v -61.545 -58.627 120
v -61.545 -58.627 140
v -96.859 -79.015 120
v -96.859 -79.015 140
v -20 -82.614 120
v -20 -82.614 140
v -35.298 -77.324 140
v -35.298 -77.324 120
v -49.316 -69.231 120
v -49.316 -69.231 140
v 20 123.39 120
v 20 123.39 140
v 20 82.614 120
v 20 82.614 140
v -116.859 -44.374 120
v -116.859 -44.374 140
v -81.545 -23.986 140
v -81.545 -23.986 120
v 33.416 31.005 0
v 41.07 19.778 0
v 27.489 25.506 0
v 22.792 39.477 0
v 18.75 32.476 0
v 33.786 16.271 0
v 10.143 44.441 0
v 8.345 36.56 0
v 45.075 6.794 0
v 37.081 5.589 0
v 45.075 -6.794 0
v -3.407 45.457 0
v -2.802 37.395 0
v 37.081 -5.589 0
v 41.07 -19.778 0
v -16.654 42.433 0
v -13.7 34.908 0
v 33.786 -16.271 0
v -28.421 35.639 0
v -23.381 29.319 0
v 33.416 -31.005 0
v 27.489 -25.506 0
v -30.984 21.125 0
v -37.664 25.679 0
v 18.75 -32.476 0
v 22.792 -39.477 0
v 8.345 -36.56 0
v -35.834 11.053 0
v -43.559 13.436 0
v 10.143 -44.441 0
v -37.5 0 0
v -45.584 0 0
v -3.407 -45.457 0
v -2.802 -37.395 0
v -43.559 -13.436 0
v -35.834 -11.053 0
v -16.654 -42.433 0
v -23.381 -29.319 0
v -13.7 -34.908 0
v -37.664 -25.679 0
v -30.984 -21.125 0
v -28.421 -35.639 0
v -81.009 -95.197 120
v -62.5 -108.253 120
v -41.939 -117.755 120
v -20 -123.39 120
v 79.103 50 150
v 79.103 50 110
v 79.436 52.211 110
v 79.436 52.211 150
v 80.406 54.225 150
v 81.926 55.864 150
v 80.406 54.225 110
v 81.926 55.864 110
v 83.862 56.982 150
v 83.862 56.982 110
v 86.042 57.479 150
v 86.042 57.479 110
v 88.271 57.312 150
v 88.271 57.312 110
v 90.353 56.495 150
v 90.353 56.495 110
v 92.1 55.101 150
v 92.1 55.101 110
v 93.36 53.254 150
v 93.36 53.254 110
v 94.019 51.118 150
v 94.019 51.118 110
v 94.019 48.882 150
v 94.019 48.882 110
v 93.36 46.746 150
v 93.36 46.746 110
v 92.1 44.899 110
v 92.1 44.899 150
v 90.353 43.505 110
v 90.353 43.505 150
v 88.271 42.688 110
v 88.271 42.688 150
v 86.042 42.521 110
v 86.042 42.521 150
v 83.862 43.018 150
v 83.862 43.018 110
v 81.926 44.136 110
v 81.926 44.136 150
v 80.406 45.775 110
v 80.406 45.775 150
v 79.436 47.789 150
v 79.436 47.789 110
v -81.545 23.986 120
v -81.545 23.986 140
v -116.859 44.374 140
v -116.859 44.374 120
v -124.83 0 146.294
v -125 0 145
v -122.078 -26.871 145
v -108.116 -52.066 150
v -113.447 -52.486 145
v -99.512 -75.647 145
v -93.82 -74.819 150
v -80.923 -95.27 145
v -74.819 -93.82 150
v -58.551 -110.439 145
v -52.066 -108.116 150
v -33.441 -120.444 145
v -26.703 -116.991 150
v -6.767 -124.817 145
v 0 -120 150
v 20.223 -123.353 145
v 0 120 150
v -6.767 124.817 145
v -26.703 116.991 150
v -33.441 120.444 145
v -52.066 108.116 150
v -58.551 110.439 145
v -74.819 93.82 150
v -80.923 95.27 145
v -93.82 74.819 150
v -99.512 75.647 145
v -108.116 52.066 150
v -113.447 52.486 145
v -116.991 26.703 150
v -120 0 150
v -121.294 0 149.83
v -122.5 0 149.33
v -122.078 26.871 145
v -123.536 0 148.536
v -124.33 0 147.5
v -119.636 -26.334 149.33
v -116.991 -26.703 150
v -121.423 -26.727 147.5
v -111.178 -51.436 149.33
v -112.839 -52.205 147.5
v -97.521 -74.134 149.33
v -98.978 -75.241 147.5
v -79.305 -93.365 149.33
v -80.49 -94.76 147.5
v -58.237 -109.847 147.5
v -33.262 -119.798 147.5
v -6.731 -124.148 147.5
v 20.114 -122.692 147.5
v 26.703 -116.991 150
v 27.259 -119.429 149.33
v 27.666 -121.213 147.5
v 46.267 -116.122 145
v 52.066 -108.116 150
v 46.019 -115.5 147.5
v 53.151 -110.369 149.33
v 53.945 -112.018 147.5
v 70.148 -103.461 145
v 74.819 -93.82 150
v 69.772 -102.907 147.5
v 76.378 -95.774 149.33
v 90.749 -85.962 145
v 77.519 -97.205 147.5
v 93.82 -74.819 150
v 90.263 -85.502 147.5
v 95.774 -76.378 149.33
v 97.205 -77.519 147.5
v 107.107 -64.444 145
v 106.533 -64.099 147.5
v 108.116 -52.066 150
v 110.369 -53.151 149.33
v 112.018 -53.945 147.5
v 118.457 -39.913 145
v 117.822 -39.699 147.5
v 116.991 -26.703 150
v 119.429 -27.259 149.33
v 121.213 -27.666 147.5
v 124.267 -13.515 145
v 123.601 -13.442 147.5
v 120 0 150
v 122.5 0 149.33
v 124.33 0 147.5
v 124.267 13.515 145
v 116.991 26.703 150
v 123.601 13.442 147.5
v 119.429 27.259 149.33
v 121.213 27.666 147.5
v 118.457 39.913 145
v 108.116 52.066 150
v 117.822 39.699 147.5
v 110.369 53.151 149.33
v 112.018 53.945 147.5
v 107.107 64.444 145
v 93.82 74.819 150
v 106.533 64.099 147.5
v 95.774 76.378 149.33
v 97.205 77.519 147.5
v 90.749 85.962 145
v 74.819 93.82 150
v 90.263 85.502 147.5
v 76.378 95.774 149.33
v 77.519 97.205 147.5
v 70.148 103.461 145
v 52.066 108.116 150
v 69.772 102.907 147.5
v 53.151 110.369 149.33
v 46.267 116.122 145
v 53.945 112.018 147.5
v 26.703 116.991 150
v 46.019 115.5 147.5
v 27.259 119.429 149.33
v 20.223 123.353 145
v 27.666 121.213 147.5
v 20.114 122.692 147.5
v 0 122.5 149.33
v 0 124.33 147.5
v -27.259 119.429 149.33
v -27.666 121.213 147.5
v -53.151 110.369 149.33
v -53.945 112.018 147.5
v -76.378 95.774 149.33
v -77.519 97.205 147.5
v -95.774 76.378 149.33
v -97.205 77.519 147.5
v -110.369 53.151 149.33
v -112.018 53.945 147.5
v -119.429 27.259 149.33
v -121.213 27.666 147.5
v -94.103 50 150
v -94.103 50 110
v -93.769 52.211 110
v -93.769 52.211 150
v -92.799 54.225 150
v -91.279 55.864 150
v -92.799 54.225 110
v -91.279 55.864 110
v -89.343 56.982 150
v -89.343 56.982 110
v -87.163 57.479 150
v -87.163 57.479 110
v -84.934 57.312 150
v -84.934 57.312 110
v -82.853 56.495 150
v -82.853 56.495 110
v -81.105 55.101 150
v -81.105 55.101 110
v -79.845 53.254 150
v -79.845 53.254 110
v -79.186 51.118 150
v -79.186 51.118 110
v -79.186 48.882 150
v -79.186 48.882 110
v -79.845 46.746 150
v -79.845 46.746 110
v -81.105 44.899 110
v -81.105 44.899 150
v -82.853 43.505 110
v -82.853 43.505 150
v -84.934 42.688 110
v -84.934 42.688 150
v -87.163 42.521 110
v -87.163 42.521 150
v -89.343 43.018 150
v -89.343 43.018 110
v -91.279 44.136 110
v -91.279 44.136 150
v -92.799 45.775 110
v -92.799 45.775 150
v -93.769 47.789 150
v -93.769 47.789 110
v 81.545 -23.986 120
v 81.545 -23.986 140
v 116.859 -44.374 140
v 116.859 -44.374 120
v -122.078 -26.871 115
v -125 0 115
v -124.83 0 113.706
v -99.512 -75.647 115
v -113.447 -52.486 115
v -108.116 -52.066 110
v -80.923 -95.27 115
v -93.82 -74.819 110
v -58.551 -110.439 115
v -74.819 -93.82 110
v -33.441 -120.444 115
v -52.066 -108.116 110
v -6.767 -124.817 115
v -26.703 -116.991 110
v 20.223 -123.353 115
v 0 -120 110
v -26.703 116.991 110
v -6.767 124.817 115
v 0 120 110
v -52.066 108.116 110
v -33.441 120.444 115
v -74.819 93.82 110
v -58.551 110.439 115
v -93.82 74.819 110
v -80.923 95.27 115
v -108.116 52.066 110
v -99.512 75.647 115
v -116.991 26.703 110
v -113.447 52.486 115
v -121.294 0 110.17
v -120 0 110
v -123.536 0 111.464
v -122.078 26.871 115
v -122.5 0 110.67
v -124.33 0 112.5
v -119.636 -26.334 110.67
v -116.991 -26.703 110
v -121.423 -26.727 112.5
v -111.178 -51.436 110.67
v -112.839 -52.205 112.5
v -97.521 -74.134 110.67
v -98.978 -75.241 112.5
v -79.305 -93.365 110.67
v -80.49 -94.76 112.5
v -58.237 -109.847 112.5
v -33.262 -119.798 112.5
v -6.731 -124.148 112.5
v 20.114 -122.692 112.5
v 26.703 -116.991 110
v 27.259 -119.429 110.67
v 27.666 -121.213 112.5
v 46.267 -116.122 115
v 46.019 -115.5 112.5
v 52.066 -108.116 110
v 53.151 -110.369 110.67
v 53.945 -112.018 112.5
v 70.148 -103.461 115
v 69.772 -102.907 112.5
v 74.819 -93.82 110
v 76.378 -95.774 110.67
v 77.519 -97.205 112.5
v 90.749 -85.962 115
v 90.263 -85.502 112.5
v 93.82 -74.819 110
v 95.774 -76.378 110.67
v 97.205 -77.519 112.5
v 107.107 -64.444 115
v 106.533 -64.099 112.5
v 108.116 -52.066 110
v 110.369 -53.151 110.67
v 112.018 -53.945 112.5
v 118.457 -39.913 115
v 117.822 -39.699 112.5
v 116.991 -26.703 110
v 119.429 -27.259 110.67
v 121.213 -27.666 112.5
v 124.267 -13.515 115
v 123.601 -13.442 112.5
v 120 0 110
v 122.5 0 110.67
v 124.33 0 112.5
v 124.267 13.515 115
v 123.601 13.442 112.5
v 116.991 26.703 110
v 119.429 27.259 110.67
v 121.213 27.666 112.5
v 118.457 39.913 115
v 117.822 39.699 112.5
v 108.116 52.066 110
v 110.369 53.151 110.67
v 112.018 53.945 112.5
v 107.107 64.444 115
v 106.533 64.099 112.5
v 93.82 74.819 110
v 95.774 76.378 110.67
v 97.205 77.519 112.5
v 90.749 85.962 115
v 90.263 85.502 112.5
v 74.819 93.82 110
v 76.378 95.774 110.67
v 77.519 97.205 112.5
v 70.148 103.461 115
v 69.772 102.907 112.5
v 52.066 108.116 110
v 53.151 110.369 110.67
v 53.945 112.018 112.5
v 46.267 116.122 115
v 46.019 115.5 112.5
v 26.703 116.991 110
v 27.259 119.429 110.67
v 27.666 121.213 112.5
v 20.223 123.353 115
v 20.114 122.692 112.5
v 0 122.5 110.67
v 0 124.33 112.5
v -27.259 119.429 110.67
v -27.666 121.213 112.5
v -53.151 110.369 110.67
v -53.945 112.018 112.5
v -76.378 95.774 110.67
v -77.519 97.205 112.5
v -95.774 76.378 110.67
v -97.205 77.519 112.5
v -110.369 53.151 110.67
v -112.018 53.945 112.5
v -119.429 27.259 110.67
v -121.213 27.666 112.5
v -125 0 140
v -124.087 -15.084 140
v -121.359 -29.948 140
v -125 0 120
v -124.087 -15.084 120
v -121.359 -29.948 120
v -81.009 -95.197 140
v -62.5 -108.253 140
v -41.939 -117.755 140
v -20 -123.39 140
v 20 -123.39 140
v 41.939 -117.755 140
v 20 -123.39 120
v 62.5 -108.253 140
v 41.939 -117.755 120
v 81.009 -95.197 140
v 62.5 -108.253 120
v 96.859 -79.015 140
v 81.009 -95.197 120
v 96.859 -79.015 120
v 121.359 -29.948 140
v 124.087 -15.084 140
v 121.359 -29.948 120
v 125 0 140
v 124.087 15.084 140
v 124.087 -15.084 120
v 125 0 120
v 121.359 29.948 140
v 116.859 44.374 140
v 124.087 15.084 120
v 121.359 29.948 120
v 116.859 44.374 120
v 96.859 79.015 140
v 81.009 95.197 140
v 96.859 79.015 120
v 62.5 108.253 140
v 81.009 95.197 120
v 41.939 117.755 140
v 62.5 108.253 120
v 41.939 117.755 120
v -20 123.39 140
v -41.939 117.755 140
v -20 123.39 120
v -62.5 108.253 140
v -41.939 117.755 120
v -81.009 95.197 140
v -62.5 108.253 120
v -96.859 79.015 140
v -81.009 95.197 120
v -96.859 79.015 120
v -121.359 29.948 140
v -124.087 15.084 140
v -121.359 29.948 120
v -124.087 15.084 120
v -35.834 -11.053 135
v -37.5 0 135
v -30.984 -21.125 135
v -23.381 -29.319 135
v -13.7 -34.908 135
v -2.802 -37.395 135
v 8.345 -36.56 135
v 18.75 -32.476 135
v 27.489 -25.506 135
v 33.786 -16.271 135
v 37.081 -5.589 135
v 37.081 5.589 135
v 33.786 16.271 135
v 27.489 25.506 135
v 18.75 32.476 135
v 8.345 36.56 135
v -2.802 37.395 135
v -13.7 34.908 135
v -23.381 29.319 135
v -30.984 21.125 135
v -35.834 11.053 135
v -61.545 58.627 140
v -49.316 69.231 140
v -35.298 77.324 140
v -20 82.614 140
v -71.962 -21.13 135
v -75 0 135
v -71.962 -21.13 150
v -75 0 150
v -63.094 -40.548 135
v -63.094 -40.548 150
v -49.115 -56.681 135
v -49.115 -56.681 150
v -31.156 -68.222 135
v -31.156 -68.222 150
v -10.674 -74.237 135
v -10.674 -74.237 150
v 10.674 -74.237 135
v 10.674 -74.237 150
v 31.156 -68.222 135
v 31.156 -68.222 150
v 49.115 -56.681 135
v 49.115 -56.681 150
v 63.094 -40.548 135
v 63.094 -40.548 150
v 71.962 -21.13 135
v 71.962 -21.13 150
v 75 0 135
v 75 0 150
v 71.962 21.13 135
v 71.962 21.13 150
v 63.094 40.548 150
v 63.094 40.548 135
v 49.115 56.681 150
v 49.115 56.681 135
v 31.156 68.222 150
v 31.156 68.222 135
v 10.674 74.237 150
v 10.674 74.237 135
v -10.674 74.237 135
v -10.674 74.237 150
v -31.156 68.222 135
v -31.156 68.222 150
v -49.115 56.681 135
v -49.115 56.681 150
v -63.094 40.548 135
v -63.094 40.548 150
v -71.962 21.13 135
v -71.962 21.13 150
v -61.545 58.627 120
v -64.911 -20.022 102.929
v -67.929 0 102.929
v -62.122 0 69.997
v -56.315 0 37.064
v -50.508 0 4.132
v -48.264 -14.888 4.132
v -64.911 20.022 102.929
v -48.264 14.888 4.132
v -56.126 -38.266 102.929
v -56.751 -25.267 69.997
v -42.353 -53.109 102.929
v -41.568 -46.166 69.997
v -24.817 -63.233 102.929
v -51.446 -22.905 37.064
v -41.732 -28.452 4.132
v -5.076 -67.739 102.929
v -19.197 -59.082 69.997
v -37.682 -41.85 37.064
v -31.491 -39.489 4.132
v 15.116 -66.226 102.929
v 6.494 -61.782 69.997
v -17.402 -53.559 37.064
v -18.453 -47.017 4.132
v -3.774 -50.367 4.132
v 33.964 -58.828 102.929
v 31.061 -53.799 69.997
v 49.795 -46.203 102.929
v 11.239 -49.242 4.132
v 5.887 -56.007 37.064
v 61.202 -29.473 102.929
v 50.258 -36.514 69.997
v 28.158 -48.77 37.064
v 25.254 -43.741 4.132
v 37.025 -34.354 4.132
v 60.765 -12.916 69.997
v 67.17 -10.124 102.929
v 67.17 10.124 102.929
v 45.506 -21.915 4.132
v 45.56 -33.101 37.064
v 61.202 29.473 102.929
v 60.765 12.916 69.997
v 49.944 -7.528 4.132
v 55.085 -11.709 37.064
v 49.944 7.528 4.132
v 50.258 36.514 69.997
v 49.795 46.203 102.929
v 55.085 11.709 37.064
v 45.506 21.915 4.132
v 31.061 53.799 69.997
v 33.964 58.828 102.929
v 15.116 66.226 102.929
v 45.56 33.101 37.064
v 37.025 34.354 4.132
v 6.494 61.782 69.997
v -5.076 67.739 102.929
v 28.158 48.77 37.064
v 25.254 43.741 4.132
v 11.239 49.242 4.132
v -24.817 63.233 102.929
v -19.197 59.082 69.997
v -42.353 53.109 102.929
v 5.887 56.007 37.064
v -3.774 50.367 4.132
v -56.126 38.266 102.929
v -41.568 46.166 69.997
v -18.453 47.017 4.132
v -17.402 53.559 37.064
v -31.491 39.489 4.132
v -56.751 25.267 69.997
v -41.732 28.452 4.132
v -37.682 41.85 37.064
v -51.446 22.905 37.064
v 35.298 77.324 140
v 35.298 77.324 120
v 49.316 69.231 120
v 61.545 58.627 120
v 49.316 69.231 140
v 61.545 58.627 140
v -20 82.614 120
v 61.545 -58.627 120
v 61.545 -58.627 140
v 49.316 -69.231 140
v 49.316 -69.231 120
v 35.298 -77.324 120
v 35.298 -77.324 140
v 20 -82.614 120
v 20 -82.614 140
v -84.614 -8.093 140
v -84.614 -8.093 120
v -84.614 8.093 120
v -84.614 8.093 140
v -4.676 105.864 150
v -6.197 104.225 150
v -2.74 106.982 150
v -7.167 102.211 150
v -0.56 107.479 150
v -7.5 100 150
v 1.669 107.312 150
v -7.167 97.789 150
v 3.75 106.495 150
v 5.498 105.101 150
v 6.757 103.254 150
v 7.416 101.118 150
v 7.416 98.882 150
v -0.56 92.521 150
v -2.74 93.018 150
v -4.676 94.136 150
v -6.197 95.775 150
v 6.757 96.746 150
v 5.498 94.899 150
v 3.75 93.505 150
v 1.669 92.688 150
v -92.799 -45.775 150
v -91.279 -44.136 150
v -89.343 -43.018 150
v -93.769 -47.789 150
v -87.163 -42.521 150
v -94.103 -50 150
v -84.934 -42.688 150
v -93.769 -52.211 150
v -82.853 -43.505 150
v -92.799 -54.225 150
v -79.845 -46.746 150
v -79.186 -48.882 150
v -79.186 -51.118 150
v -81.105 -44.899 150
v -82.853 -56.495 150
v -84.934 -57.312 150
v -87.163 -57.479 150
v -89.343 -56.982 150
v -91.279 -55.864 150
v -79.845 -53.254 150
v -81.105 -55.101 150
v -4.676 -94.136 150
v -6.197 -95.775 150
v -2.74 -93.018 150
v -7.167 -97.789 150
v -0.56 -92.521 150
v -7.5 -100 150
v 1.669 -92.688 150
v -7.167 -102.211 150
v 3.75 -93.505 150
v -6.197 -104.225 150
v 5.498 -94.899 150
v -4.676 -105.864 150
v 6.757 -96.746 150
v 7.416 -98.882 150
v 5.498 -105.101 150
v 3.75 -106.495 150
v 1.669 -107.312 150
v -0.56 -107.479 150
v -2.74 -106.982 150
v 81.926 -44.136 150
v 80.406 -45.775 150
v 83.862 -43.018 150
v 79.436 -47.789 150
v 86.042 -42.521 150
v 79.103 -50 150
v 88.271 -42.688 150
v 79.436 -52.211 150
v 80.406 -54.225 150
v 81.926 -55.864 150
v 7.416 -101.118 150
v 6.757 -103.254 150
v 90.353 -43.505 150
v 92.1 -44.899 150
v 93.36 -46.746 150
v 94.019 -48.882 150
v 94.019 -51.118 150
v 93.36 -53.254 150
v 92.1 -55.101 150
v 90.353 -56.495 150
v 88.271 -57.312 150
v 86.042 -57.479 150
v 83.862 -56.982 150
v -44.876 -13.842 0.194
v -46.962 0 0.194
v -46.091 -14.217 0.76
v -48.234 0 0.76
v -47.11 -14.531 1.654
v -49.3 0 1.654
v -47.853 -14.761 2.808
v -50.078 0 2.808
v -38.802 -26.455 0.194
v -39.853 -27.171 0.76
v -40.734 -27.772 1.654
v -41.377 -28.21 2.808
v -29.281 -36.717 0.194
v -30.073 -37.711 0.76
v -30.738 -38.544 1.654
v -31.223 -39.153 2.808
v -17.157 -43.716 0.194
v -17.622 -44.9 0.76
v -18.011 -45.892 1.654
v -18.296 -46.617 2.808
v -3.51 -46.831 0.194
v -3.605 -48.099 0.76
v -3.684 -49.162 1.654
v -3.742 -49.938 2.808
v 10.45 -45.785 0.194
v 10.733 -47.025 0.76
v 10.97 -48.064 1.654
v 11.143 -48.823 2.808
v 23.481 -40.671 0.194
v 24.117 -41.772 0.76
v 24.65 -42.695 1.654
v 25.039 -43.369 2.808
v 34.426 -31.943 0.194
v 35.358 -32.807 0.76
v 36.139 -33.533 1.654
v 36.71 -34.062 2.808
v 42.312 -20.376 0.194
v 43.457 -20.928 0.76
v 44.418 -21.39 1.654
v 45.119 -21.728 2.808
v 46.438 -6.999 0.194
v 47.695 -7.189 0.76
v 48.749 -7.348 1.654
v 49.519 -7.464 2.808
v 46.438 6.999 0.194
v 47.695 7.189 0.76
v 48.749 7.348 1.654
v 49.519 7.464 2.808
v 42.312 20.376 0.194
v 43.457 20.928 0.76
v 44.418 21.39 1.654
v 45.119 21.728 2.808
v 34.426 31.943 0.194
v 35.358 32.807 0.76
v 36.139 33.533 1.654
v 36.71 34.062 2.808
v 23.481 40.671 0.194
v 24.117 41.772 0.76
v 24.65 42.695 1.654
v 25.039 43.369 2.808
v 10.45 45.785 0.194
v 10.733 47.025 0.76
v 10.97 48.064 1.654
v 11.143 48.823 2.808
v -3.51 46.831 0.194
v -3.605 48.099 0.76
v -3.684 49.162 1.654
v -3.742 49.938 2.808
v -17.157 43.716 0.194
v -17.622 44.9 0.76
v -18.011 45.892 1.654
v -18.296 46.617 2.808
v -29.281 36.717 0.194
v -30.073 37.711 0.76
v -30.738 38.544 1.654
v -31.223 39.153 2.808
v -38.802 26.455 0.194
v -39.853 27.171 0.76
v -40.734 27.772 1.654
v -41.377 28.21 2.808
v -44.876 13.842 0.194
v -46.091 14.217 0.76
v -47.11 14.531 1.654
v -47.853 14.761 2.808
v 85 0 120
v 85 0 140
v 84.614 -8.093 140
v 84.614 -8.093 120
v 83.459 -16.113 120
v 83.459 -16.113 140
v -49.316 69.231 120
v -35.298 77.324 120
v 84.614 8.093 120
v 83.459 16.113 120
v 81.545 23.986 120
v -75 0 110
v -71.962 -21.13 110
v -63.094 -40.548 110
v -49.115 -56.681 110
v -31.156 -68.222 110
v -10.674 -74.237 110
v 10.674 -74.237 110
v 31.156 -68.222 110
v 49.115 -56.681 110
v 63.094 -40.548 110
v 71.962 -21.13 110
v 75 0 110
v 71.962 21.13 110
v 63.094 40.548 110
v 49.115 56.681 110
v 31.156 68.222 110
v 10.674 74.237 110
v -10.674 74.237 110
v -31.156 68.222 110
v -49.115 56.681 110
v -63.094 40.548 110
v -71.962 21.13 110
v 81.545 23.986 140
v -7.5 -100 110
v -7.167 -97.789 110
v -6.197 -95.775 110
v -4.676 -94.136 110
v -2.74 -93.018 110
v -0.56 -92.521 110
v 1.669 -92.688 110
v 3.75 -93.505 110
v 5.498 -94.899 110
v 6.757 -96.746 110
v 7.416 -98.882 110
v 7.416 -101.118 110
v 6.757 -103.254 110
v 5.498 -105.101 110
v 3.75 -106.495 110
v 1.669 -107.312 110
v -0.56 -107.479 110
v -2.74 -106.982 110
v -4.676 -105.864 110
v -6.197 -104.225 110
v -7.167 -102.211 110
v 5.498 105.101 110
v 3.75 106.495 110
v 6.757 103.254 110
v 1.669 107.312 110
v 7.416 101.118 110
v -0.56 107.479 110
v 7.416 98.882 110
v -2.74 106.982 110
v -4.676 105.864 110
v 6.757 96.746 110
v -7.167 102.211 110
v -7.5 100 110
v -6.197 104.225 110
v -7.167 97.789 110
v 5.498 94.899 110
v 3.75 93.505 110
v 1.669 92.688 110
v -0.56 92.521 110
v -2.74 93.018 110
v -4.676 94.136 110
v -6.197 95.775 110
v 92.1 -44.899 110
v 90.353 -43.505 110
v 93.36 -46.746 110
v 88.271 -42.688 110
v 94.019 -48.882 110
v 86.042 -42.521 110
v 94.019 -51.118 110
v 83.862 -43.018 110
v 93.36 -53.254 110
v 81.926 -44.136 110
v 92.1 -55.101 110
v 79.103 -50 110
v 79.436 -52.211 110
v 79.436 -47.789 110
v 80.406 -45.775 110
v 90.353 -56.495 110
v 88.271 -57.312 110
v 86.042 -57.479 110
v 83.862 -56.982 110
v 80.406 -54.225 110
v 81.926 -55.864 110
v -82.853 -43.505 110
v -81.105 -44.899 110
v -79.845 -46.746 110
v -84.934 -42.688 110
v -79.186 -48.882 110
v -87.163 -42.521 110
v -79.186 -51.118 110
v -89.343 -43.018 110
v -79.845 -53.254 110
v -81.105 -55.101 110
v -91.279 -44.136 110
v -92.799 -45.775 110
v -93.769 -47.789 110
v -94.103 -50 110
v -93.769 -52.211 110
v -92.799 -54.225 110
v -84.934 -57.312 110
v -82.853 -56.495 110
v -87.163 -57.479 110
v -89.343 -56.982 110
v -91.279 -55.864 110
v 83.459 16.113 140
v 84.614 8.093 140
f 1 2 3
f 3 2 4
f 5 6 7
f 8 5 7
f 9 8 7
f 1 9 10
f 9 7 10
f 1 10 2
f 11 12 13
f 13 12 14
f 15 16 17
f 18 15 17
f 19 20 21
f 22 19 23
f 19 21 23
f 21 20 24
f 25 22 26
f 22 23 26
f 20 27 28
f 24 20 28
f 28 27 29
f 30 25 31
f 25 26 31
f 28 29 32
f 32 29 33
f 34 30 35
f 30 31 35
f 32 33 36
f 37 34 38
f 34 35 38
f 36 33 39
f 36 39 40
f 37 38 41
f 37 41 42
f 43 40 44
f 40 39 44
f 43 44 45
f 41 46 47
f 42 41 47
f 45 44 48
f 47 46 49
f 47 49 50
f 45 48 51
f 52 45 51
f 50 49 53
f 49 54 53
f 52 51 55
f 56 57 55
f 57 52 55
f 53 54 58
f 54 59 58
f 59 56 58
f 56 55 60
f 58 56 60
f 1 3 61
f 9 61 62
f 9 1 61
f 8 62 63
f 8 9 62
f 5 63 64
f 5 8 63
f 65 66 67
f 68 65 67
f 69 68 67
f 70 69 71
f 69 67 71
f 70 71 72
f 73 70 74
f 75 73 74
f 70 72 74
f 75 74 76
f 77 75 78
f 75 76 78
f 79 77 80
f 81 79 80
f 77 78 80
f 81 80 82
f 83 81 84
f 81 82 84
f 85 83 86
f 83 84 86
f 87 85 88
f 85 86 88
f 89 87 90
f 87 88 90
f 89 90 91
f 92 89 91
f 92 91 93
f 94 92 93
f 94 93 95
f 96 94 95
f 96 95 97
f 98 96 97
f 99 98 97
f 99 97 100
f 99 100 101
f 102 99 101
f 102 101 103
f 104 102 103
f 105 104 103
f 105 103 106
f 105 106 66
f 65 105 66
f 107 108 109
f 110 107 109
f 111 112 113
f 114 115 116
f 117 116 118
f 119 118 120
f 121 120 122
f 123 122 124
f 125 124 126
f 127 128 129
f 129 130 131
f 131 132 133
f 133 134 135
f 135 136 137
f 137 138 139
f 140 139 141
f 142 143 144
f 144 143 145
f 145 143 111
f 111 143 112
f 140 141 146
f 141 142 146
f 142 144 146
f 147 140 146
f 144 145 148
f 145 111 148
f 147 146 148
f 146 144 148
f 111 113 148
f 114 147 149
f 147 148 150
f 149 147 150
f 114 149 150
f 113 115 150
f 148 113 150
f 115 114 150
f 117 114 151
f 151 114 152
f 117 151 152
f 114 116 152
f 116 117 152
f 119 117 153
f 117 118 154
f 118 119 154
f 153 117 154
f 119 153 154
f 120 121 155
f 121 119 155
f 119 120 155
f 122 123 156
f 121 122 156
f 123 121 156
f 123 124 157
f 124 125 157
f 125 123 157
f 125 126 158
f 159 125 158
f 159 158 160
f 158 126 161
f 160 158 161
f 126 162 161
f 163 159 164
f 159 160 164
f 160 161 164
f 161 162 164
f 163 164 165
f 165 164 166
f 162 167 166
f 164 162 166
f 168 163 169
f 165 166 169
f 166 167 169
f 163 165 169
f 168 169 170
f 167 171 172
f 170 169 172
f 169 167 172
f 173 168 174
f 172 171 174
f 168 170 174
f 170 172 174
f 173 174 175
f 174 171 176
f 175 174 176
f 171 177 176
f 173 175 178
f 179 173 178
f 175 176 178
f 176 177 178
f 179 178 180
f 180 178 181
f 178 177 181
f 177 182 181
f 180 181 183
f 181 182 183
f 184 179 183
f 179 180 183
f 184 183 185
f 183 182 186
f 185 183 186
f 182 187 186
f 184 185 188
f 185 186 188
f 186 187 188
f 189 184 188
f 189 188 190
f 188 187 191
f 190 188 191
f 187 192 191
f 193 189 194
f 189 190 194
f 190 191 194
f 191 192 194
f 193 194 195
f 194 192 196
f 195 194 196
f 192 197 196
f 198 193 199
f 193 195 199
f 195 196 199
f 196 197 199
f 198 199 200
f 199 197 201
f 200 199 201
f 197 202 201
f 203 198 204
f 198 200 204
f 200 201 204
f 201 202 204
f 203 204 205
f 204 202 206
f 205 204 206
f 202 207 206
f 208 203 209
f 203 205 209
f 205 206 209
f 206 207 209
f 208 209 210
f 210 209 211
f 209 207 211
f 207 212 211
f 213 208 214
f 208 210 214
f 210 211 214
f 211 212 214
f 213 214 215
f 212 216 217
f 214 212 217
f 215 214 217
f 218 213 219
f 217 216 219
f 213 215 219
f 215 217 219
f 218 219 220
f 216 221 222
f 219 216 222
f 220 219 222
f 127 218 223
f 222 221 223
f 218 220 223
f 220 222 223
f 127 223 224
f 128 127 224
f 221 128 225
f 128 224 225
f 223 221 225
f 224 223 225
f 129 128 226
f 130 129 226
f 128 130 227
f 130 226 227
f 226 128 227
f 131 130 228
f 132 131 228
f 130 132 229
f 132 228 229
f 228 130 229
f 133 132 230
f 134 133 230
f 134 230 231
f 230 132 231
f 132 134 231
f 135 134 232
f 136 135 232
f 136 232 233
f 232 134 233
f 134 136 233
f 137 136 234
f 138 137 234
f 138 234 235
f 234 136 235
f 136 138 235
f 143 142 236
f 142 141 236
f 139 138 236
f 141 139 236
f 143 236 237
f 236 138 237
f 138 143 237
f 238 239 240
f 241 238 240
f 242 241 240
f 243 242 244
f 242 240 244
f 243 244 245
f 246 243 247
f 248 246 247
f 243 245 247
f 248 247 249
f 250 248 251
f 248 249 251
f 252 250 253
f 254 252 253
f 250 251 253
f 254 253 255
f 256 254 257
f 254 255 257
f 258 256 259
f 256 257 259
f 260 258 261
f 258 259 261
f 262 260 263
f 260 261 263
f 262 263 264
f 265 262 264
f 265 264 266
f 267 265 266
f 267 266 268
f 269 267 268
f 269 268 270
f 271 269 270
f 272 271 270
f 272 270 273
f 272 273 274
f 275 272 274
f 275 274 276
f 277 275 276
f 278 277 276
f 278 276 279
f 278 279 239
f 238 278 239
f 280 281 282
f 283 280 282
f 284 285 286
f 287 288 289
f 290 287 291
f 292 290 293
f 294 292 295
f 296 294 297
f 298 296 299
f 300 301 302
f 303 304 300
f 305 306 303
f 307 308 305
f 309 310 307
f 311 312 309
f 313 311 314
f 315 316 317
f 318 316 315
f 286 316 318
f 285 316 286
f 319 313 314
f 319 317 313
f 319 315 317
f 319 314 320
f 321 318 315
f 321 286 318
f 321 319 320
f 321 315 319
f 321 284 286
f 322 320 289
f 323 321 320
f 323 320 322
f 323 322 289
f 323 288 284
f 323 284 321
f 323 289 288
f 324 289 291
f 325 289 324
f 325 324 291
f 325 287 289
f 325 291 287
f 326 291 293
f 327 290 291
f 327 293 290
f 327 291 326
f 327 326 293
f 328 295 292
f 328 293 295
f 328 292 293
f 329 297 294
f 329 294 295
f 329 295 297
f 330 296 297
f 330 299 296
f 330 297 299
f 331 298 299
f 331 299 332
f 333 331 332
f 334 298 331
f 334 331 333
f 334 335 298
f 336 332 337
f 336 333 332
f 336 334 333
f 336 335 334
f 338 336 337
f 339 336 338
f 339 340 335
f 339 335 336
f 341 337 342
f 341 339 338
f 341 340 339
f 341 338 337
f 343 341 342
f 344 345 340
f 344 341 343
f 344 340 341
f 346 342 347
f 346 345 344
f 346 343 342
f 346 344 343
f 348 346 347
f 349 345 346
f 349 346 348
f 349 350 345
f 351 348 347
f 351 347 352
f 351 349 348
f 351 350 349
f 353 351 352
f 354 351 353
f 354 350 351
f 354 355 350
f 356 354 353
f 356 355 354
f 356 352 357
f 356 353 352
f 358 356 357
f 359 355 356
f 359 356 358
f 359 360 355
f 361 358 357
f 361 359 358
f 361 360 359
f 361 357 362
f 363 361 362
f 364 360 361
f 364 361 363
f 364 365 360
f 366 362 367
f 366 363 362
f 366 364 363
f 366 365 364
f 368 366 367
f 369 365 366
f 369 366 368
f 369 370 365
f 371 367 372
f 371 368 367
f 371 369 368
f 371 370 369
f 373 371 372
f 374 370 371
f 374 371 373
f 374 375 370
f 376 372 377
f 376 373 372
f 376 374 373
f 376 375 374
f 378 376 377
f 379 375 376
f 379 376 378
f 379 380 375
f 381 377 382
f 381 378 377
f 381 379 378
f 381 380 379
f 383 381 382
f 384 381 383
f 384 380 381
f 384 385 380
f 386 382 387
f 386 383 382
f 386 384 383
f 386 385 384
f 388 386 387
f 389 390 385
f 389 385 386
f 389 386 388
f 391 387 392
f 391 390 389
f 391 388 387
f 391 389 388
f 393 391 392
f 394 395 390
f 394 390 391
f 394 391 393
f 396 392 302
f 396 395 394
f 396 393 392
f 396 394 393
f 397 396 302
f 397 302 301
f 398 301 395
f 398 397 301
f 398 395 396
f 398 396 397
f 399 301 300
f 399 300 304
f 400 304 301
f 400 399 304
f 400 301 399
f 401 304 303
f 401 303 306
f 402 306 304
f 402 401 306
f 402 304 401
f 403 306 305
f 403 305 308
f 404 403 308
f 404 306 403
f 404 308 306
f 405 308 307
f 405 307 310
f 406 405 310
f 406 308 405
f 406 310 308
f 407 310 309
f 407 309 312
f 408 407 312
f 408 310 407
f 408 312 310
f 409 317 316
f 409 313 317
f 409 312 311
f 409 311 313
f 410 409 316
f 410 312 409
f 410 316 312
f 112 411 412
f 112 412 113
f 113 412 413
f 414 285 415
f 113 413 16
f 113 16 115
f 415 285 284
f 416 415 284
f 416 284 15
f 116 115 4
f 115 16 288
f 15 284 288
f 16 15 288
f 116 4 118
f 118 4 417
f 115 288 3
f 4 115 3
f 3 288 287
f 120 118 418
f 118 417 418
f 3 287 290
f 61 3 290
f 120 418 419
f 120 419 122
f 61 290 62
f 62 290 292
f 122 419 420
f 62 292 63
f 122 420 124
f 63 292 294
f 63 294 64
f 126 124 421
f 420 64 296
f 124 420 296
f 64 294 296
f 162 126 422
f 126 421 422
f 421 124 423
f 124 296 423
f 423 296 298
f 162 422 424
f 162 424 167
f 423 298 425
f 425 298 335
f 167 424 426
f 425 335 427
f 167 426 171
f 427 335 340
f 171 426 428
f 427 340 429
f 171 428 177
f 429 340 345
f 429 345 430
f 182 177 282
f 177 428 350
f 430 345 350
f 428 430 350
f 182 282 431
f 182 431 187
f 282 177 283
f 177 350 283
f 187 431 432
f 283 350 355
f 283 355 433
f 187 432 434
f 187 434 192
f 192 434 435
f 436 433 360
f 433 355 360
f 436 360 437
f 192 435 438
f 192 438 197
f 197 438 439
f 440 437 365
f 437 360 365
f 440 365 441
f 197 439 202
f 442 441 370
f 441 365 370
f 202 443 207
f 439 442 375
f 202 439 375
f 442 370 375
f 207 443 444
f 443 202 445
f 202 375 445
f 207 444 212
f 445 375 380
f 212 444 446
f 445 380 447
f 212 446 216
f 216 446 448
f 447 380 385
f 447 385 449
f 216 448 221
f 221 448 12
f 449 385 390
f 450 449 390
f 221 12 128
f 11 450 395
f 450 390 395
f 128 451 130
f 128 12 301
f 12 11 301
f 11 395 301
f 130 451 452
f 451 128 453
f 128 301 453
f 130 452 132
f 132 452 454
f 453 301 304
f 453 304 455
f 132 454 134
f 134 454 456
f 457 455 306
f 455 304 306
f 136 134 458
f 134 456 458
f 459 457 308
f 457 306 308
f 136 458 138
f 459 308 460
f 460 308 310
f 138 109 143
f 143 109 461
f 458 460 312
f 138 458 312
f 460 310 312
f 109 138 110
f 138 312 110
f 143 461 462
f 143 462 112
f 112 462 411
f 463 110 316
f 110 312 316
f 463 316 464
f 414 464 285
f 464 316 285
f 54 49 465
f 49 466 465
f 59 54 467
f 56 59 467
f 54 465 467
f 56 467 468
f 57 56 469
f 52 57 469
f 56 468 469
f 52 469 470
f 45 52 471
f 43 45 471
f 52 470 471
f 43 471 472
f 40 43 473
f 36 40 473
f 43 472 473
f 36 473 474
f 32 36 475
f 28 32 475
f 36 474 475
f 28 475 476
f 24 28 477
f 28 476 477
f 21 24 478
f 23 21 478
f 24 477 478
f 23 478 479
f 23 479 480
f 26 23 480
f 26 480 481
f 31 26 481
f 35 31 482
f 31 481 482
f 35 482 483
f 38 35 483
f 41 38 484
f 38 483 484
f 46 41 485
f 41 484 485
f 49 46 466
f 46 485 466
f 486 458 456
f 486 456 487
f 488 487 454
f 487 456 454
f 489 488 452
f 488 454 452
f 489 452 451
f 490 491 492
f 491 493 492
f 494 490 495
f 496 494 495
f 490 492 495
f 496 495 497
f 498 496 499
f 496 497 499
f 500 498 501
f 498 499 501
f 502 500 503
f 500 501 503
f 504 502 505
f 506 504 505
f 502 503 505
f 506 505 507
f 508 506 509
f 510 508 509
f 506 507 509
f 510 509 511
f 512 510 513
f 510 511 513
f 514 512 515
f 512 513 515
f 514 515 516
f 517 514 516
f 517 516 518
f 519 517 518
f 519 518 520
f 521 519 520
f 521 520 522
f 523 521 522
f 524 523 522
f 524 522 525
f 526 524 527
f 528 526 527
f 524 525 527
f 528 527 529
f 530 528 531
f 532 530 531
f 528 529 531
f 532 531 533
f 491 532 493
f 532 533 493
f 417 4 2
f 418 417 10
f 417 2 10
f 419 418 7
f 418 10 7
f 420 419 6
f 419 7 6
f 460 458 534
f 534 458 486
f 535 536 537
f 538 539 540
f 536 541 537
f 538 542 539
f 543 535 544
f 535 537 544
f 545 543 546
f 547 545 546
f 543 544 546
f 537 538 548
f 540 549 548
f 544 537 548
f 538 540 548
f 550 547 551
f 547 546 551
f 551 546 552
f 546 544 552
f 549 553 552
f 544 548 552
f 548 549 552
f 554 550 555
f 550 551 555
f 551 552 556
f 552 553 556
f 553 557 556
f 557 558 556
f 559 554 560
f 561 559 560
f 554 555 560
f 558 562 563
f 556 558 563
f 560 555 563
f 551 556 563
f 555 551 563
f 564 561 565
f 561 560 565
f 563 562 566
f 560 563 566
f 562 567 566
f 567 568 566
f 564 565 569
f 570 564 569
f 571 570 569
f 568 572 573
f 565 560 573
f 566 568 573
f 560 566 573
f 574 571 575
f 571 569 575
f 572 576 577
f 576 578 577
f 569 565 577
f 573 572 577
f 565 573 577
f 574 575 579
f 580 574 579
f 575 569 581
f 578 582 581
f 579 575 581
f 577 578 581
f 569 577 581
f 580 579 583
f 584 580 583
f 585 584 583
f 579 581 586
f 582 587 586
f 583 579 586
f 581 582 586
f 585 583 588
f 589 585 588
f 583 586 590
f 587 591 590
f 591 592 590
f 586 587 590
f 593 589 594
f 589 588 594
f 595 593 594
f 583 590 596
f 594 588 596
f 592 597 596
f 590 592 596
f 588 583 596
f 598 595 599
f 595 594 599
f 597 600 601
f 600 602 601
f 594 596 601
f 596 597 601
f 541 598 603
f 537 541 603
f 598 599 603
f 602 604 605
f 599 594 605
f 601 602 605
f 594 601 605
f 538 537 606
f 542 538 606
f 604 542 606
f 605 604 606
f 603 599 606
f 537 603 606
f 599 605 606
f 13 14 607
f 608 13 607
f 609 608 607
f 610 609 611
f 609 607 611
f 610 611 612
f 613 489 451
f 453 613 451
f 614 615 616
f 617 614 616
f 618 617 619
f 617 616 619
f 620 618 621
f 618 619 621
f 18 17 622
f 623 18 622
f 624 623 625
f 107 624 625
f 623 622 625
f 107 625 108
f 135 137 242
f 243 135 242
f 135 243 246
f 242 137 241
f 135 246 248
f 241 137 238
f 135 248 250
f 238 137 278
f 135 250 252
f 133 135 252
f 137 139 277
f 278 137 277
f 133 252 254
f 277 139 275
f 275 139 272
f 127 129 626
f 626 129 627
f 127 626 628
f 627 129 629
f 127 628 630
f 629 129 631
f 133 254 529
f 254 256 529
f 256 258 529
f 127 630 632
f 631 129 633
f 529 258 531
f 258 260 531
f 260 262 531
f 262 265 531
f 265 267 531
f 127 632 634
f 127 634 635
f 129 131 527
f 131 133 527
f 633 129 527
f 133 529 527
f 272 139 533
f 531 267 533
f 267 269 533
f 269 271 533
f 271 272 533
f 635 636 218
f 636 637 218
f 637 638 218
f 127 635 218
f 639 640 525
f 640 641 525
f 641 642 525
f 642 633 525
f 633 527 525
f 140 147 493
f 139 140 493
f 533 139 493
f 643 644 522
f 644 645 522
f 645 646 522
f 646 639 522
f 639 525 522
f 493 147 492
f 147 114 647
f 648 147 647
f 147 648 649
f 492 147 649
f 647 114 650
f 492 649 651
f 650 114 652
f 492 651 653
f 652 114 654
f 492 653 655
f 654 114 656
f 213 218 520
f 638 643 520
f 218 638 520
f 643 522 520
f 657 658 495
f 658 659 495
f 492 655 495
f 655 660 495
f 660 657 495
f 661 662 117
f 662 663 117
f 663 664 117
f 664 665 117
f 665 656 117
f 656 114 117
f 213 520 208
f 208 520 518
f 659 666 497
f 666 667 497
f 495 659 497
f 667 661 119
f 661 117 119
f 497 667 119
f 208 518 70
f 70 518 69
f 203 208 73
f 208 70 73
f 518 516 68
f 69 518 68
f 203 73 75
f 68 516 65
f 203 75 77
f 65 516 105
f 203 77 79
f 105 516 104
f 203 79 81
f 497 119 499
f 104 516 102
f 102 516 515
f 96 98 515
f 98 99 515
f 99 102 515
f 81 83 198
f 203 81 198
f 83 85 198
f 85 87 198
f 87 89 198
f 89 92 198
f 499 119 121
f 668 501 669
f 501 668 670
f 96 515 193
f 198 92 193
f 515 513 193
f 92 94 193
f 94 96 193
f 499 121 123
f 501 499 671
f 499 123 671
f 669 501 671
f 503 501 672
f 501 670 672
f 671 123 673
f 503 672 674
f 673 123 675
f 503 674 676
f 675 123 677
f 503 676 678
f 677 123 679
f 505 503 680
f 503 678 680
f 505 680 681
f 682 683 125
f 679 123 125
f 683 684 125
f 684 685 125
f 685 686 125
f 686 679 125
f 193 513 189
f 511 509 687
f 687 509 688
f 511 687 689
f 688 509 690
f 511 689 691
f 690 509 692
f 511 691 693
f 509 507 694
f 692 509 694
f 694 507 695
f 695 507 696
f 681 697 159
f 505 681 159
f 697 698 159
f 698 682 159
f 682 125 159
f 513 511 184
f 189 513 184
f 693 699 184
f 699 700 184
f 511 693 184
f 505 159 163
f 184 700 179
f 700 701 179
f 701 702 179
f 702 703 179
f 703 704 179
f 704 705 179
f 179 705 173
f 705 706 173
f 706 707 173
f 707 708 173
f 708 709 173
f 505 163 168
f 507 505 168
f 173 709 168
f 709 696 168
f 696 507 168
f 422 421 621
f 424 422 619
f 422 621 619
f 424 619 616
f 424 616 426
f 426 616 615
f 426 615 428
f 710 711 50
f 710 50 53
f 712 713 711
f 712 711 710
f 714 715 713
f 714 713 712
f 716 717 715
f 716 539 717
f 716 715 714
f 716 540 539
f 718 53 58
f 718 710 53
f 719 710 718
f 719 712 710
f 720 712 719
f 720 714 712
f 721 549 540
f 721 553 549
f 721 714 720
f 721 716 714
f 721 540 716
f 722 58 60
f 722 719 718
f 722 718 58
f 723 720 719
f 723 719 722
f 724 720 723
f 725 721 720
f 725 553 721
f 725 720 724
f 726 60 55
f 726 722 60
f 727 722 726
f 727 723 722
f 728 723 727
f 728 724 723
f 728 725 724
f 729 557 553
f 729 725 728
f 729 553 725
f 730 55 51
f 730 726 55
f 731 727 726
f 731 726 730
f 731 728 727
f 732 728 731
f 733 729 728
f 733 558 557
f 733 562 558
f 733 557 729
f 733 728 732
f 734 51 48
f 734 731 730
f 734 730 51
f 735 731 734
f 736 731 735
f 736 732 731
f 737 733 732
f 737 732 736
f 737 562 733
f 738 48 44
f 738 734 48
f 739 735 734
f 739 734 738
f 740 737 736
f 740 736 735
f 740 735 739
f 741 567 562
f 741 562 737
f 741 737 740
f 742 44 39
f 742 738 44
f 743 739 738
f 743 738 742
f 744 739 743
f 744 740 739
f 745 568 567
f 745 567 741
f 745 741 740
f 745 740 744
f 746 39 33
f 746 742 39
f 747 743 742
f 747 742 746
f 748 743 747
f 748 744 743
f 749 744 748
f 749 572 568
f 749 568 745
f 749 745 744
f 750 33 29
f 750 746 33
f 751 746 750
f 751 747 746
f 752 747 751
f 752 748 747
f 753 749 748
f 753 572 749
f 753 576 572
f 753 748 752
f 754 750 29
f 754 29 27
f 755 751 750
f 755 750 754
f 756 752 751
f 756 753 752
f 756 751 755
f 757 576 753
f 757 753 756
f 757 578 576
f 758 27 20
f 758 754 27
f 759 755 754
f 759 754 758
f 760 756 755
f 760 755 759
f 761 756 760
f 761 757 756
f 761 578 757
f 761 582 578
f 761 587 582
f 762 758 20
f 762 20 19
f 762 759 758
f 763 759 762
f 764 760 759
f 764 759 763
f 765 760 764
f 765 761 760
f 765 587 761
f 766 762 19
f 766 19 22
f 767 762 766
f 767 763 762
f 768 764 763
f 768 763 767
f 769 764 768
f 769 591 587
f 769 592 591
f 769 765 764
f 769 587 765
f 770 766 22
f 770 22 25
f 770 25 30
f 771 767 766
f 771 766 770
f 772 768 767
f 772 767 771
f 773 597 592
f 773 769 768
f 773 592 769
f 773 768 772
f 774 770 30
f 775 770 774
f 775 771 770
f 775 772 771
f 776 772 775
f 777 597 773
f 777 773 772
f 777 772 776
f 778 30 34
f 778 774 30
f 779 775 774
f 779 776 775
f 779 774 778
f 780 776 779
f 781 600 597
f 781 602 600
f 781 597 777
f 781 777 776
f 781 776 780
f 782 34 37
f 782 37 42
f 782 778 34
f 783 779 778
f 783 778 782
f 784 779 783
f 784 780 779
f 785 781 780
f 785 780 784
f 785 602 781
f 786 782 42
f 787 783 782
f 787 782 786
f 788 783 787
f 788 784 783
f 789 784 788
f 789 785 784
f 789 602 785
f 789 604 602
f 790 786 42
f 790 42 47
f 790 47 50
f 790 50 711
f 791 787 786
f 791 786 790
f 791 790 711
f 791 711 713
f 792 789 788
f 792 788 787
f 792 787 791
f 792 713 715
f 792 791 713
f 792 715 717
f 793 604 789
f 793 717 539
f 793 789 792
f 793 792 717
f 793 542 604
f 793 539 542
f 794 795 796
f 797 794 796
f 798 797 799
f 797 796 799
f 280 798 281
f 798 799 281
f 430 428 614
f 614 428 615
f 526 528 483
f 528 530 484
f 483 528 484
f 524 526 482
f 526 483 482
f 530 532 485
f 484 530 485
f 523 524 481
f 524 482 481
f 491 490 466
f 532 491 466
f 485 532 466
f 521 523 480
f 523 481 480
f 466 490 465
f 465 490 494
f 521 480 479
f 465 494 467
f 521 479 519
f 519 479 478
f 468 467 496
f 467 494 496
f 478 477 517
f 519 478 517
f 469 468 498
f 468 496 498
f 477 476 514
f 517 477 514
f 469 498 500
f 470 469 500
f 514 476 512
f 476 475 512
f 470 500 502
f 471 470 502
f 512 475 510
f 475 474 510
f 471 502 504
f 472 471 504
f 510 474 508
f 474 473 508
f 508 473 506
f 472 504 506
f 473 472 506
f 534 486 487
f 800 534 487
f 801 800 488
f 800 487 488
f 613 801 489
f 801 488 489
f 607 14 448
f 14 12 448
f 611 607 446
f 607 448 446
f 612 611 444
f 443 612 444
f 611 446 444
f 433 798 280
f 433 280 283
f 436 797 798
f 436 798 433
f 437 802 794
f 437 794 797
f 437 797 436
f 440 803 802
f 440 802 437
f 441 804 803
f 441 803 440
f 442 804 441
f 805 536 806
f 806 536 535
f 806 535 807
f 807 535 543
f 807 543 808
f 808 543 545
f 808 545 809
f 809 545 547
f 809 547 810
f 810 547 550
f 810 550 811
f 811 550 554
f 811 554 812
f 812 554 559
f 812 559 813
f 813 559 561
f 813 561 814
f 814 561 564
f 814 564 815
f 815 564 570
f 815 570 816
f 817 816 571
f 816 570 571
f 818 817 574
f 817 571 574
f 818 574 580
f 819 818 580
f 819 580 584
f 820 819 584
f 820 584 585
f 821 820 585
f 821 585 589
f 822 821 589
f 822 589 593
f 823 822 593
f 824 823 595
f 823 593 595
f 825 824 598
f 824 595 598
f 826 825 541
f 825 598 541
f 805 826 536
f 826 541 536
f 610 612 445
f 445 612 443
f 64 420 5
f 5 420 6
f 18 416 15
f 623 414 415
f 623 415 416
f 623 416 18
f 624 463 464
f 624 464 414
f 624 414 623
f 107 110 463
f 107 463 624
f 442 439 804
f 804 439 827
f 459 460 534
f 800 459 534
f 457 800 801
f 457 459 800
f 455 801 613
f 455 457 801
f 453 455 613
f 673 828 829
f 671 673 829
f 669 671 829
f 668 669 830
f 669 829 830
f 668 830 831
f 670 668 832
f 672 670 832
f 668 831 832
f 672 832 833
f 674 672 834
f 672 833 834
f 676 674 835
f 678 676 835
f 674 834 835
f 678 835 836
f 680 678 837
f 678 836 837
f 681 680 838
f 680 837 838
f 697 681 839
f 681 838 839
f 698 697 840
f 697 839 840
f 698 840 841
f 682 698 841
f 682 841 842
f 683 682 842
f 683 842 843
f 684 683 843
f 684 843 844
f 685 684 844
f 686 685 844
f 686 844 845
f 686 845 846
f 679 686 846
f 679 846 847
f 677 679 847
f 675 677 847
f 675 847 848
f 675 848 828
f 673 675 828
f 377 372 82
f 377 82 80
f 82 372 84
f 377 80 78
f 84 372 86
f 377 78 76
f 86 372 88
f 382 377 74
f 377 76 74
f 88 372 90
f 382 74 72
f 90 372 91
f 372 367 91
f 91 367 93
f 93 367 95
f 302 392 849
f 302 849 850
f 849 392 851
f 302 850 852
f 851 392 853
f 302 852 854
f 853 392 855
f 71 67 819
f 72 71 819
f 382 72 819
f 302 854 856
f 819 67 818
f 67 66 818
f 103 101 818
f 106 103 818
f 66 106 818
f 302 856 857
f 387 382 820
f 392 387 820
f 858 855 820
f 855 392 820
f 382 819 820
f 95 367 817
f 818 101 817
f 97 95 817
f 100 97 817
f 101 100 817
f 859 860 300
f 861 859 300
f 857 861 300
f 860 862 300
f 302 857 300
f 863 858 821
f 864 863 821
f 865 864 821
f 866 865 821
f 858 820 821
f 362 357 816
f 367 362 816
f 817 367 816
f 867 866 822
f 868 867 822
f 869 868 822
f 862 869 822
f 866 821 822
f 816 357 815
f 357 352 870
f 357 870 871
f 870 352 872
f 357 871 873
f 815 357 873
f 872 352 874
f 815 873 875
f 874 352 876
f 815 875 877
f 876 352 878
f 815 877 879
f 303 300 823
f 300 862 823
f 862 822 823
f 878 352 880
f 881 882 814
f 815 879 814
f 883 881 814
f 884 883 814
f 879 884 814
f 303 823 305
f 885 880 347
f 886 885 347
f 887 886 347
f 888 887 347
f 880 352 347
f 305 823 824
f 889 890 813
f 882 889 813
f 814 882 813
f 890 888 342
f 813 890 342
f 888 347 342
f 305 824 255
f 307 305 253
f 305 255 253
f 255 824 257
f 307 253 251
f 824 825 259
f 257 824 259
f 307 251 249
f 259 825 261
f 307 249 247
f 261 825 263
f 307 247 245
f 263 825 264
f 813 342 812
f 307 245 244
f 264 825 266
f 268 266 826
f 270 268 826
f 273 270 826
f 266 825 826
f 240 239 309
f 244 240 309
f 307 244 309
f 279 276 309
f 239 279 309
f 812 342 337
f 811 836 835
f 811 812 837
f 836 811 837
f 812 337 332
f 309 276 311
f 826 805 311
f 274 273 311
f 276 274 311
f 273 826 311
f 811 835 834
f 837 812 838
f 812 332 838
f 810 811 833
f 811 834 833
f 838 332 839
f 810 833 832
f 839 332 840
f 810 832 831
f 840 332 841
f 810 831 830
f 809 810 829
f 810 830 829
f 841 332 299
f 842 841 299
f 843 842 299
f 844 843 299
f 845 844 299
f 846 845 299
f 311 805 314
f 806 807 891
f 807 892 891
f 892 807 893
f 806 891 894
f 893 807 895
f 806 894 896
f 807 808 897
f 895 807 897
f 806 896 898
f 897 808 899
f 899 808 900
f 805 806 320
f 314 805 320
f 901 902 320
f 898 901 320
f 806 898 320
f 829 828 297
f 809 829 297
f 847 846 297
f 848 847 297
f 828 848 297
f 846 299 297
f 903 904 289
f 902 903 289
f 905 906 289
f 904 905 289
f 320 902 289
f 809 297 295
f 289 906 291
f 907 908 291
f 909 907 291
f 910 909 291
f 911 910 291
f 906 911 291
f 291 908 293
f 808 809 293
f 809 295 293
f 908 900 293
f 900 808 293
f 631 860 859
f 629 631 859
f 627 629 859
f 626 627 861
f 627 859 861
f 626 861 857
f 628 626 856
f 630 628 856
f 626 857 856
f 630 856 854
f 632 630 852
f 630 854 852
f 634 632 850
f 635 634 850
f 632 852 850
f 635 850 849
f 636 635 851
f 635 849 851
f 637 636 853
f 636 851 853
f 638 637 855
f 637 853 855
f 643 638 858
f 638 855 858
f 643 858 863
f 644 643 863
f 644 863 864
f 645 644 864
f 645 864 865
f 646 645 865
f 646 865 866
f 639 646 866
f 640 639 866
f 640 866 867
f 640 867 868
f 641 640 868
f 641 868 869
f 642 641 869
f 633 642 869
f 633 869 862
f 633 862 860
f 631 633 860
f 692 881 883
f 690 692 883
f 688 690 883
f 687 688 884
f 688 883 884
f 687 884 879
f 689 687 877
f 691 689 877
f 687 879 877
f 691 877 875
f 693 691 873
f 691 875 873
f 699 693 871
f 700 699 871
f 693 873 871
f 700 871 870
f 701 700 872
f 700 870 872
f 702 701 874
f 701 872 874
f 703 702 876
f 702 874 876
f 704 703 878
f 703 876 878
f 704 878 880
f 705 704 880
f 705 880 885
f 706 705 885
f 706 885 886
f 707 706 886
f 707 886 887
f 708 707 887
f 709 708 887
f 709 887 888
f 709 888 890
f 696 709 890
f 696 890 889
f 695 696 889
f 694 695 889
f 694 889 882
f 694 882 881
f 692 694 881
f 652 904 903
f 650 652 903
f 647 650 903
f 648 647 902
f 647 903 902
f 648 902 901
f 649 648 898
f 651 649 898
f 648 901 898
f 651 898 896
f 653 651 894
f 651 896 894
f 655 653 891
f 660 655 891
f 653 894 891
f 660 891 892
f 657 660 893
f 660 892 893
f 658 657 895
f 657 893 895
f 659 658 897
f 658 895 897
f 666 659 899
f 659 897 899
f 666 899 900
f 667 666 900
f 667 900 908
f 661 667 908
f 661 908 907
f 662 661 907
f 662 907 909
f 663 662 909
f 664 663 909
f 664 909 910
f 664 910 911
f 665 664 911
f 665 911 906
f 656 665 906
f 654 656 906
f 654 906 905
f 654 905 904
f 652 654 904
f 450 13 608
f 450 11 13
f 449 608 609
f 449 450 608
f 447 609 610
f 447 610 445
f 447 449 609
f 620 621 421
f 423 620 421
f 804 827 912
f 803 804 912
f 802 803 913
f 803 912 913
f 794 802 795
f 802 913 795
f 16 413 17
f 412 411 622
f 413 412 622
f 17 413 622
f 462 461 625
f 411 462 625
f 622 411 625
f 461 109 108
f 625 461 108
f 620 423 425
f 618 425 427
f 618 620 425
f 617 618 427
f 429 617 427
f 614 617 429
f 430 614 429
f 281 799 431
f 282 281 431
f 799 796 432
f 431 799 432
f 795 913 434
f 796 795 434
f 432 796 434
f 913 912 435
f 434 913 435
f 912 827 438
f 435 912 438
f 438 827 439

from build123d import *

# Parameters (mm, degrees)
F4_DEPTH = 20
F5_R     = 5
F7_D     = 15


with BuildPart() as f1:
    # F0 (on Front) → F1 (revolve)
    with BuildSketch(Plane.XZ):
        Polygon((-37.5, 0), (-37.5, 135), (-75, 135), (-75, 150), (-125, 150), (-125, 110), (-75, 110), (-67.9289321881, 102.9289321881), (-49.7797843479, 0), align=None)
    revolve(axis=Axis((0, 0, 75), (0, 0, 1)))

    # F3 (on offset) → F4 (cut)
    with BuildSketch(Plane.XY.offset(140)):
        with BuildLine():
            ThreePointArc((-61.5454401063, 58.6272871803), (-42.5, 73.6121593217), (-20, 82.6135582093))
            Line((-20, 82.6135582093), (-20, 123.3896267925))
            ThreePointArc((-20, 123.3896267925), (-62.5, 108.2531754731), (-96.8585513658, 79.015321472))
            Line((-96.8585513658, 79.015321472), (-61.5454401063, 58.6272871803))
        make_face()
        with BuildLine():
            ThreePointArc((20, 82.6135582093), (42.5, 73.6121593217), (61.5454401063, 58.6272871803))
            Line((61.5454401063, 58.6272871803), (96.8585513658, 79.015321472))
            ThreePointArc((96.8585513658, 79.015321472), (62.5, 108.2531754731), (20, 123.3896267925))
            Line((20, 123.3896267925), (20, 82.6135582093))
        make_face()
        with BuildLine():
            ThreePointArc((81.5454401063, 23.986271029), (84.1319273791, 12.1168806004), (85, 0))
            ThreePointArc((85, 0), (84.1319273791, -12.1168806004), (81.5454401063, -23.986271029))
            Line((81.5454401063, -23.986271029), (116.8585513658, -44.3743053206))
            ThreePointArc((116.8585513658, -44.3743053206), (122.9477916043, -22.5574940904), (125, 0))
            ThreePointArc((125, 0), (122.9477916043, 22.5574940904), (116.8585513658, 44.3743053206))
            Line((116.8585513658, 44.3743053206), (81.5454401063, 23.986271029))
        make_face()
        with BuildLine():
            Line((96.8585513658, -79.015321472), (61.5454401063, -58.6272871803))
            ThreePointArc((61.5454401063, -58.6272871803), (42.5, -73.6121593217), (20, -82.6135582093))
            Line((20, -82.6135582093), (20, -123.3896267925))
            ThreePointArc((20, -123.3896267925), (62.5, -108.2531754731), (96.8585513658, -79.015321472))
        make_face()
        with BuildLine():
            Line((-20, -123.3896267925), (-20, -82.6135582093))
            ThreePointArc((-20, -82.6135582093), (-42.5, -73.6121593217), (-61.5454401063, -58.6272871803))
            Line((-61.5454401063, -58.6272871803), (-96.8585513658, -79.015321472))
            ThreePointArc((-96.8585513658, -79.015321472), (-62.5, -108.2531754731), (-20, -123.3896267925))
        make_face()
        with BuildLine():
            ThreePointArc((-81.5454401063, -23.986271029), (-85, 0), (-81.5454401063, 23.986271029))
            Line((-81.5454401063, 23.986271029), (-116.8585513658, 44.3743053206))
            ThreePointArc((-116.8585513658, 44.3743053206), (-125, 0), (-116.8585513658, -44.3743053206))
            Line((-116.8585513658, -44.3743053206), (-81.5454401063, -23.986271029))
        make_face()
    extrude(amount=-F4_DEPTH, mode=Mode.SUBTRACT)

    # F5
    f5_edges = [f1.edges().sort_by_distance(p)[0] for p in [
        (125, 0, 150),
        (125, 0, 110),
        (49.779784, 0, 0),
    ]]
    fillet(f5_edges, radius=F5_R)

    # F7 (through all)
    with Locations(Plane.XY.offset(150)):
        with Locations((86.6025403784, 50), (86.6025403784, -50), (0, -100), (-86.6025403784, -50), (-86.6025403784, 50), (0, 100)):
            Hole(F7_D / 2)


solid = f1.part
